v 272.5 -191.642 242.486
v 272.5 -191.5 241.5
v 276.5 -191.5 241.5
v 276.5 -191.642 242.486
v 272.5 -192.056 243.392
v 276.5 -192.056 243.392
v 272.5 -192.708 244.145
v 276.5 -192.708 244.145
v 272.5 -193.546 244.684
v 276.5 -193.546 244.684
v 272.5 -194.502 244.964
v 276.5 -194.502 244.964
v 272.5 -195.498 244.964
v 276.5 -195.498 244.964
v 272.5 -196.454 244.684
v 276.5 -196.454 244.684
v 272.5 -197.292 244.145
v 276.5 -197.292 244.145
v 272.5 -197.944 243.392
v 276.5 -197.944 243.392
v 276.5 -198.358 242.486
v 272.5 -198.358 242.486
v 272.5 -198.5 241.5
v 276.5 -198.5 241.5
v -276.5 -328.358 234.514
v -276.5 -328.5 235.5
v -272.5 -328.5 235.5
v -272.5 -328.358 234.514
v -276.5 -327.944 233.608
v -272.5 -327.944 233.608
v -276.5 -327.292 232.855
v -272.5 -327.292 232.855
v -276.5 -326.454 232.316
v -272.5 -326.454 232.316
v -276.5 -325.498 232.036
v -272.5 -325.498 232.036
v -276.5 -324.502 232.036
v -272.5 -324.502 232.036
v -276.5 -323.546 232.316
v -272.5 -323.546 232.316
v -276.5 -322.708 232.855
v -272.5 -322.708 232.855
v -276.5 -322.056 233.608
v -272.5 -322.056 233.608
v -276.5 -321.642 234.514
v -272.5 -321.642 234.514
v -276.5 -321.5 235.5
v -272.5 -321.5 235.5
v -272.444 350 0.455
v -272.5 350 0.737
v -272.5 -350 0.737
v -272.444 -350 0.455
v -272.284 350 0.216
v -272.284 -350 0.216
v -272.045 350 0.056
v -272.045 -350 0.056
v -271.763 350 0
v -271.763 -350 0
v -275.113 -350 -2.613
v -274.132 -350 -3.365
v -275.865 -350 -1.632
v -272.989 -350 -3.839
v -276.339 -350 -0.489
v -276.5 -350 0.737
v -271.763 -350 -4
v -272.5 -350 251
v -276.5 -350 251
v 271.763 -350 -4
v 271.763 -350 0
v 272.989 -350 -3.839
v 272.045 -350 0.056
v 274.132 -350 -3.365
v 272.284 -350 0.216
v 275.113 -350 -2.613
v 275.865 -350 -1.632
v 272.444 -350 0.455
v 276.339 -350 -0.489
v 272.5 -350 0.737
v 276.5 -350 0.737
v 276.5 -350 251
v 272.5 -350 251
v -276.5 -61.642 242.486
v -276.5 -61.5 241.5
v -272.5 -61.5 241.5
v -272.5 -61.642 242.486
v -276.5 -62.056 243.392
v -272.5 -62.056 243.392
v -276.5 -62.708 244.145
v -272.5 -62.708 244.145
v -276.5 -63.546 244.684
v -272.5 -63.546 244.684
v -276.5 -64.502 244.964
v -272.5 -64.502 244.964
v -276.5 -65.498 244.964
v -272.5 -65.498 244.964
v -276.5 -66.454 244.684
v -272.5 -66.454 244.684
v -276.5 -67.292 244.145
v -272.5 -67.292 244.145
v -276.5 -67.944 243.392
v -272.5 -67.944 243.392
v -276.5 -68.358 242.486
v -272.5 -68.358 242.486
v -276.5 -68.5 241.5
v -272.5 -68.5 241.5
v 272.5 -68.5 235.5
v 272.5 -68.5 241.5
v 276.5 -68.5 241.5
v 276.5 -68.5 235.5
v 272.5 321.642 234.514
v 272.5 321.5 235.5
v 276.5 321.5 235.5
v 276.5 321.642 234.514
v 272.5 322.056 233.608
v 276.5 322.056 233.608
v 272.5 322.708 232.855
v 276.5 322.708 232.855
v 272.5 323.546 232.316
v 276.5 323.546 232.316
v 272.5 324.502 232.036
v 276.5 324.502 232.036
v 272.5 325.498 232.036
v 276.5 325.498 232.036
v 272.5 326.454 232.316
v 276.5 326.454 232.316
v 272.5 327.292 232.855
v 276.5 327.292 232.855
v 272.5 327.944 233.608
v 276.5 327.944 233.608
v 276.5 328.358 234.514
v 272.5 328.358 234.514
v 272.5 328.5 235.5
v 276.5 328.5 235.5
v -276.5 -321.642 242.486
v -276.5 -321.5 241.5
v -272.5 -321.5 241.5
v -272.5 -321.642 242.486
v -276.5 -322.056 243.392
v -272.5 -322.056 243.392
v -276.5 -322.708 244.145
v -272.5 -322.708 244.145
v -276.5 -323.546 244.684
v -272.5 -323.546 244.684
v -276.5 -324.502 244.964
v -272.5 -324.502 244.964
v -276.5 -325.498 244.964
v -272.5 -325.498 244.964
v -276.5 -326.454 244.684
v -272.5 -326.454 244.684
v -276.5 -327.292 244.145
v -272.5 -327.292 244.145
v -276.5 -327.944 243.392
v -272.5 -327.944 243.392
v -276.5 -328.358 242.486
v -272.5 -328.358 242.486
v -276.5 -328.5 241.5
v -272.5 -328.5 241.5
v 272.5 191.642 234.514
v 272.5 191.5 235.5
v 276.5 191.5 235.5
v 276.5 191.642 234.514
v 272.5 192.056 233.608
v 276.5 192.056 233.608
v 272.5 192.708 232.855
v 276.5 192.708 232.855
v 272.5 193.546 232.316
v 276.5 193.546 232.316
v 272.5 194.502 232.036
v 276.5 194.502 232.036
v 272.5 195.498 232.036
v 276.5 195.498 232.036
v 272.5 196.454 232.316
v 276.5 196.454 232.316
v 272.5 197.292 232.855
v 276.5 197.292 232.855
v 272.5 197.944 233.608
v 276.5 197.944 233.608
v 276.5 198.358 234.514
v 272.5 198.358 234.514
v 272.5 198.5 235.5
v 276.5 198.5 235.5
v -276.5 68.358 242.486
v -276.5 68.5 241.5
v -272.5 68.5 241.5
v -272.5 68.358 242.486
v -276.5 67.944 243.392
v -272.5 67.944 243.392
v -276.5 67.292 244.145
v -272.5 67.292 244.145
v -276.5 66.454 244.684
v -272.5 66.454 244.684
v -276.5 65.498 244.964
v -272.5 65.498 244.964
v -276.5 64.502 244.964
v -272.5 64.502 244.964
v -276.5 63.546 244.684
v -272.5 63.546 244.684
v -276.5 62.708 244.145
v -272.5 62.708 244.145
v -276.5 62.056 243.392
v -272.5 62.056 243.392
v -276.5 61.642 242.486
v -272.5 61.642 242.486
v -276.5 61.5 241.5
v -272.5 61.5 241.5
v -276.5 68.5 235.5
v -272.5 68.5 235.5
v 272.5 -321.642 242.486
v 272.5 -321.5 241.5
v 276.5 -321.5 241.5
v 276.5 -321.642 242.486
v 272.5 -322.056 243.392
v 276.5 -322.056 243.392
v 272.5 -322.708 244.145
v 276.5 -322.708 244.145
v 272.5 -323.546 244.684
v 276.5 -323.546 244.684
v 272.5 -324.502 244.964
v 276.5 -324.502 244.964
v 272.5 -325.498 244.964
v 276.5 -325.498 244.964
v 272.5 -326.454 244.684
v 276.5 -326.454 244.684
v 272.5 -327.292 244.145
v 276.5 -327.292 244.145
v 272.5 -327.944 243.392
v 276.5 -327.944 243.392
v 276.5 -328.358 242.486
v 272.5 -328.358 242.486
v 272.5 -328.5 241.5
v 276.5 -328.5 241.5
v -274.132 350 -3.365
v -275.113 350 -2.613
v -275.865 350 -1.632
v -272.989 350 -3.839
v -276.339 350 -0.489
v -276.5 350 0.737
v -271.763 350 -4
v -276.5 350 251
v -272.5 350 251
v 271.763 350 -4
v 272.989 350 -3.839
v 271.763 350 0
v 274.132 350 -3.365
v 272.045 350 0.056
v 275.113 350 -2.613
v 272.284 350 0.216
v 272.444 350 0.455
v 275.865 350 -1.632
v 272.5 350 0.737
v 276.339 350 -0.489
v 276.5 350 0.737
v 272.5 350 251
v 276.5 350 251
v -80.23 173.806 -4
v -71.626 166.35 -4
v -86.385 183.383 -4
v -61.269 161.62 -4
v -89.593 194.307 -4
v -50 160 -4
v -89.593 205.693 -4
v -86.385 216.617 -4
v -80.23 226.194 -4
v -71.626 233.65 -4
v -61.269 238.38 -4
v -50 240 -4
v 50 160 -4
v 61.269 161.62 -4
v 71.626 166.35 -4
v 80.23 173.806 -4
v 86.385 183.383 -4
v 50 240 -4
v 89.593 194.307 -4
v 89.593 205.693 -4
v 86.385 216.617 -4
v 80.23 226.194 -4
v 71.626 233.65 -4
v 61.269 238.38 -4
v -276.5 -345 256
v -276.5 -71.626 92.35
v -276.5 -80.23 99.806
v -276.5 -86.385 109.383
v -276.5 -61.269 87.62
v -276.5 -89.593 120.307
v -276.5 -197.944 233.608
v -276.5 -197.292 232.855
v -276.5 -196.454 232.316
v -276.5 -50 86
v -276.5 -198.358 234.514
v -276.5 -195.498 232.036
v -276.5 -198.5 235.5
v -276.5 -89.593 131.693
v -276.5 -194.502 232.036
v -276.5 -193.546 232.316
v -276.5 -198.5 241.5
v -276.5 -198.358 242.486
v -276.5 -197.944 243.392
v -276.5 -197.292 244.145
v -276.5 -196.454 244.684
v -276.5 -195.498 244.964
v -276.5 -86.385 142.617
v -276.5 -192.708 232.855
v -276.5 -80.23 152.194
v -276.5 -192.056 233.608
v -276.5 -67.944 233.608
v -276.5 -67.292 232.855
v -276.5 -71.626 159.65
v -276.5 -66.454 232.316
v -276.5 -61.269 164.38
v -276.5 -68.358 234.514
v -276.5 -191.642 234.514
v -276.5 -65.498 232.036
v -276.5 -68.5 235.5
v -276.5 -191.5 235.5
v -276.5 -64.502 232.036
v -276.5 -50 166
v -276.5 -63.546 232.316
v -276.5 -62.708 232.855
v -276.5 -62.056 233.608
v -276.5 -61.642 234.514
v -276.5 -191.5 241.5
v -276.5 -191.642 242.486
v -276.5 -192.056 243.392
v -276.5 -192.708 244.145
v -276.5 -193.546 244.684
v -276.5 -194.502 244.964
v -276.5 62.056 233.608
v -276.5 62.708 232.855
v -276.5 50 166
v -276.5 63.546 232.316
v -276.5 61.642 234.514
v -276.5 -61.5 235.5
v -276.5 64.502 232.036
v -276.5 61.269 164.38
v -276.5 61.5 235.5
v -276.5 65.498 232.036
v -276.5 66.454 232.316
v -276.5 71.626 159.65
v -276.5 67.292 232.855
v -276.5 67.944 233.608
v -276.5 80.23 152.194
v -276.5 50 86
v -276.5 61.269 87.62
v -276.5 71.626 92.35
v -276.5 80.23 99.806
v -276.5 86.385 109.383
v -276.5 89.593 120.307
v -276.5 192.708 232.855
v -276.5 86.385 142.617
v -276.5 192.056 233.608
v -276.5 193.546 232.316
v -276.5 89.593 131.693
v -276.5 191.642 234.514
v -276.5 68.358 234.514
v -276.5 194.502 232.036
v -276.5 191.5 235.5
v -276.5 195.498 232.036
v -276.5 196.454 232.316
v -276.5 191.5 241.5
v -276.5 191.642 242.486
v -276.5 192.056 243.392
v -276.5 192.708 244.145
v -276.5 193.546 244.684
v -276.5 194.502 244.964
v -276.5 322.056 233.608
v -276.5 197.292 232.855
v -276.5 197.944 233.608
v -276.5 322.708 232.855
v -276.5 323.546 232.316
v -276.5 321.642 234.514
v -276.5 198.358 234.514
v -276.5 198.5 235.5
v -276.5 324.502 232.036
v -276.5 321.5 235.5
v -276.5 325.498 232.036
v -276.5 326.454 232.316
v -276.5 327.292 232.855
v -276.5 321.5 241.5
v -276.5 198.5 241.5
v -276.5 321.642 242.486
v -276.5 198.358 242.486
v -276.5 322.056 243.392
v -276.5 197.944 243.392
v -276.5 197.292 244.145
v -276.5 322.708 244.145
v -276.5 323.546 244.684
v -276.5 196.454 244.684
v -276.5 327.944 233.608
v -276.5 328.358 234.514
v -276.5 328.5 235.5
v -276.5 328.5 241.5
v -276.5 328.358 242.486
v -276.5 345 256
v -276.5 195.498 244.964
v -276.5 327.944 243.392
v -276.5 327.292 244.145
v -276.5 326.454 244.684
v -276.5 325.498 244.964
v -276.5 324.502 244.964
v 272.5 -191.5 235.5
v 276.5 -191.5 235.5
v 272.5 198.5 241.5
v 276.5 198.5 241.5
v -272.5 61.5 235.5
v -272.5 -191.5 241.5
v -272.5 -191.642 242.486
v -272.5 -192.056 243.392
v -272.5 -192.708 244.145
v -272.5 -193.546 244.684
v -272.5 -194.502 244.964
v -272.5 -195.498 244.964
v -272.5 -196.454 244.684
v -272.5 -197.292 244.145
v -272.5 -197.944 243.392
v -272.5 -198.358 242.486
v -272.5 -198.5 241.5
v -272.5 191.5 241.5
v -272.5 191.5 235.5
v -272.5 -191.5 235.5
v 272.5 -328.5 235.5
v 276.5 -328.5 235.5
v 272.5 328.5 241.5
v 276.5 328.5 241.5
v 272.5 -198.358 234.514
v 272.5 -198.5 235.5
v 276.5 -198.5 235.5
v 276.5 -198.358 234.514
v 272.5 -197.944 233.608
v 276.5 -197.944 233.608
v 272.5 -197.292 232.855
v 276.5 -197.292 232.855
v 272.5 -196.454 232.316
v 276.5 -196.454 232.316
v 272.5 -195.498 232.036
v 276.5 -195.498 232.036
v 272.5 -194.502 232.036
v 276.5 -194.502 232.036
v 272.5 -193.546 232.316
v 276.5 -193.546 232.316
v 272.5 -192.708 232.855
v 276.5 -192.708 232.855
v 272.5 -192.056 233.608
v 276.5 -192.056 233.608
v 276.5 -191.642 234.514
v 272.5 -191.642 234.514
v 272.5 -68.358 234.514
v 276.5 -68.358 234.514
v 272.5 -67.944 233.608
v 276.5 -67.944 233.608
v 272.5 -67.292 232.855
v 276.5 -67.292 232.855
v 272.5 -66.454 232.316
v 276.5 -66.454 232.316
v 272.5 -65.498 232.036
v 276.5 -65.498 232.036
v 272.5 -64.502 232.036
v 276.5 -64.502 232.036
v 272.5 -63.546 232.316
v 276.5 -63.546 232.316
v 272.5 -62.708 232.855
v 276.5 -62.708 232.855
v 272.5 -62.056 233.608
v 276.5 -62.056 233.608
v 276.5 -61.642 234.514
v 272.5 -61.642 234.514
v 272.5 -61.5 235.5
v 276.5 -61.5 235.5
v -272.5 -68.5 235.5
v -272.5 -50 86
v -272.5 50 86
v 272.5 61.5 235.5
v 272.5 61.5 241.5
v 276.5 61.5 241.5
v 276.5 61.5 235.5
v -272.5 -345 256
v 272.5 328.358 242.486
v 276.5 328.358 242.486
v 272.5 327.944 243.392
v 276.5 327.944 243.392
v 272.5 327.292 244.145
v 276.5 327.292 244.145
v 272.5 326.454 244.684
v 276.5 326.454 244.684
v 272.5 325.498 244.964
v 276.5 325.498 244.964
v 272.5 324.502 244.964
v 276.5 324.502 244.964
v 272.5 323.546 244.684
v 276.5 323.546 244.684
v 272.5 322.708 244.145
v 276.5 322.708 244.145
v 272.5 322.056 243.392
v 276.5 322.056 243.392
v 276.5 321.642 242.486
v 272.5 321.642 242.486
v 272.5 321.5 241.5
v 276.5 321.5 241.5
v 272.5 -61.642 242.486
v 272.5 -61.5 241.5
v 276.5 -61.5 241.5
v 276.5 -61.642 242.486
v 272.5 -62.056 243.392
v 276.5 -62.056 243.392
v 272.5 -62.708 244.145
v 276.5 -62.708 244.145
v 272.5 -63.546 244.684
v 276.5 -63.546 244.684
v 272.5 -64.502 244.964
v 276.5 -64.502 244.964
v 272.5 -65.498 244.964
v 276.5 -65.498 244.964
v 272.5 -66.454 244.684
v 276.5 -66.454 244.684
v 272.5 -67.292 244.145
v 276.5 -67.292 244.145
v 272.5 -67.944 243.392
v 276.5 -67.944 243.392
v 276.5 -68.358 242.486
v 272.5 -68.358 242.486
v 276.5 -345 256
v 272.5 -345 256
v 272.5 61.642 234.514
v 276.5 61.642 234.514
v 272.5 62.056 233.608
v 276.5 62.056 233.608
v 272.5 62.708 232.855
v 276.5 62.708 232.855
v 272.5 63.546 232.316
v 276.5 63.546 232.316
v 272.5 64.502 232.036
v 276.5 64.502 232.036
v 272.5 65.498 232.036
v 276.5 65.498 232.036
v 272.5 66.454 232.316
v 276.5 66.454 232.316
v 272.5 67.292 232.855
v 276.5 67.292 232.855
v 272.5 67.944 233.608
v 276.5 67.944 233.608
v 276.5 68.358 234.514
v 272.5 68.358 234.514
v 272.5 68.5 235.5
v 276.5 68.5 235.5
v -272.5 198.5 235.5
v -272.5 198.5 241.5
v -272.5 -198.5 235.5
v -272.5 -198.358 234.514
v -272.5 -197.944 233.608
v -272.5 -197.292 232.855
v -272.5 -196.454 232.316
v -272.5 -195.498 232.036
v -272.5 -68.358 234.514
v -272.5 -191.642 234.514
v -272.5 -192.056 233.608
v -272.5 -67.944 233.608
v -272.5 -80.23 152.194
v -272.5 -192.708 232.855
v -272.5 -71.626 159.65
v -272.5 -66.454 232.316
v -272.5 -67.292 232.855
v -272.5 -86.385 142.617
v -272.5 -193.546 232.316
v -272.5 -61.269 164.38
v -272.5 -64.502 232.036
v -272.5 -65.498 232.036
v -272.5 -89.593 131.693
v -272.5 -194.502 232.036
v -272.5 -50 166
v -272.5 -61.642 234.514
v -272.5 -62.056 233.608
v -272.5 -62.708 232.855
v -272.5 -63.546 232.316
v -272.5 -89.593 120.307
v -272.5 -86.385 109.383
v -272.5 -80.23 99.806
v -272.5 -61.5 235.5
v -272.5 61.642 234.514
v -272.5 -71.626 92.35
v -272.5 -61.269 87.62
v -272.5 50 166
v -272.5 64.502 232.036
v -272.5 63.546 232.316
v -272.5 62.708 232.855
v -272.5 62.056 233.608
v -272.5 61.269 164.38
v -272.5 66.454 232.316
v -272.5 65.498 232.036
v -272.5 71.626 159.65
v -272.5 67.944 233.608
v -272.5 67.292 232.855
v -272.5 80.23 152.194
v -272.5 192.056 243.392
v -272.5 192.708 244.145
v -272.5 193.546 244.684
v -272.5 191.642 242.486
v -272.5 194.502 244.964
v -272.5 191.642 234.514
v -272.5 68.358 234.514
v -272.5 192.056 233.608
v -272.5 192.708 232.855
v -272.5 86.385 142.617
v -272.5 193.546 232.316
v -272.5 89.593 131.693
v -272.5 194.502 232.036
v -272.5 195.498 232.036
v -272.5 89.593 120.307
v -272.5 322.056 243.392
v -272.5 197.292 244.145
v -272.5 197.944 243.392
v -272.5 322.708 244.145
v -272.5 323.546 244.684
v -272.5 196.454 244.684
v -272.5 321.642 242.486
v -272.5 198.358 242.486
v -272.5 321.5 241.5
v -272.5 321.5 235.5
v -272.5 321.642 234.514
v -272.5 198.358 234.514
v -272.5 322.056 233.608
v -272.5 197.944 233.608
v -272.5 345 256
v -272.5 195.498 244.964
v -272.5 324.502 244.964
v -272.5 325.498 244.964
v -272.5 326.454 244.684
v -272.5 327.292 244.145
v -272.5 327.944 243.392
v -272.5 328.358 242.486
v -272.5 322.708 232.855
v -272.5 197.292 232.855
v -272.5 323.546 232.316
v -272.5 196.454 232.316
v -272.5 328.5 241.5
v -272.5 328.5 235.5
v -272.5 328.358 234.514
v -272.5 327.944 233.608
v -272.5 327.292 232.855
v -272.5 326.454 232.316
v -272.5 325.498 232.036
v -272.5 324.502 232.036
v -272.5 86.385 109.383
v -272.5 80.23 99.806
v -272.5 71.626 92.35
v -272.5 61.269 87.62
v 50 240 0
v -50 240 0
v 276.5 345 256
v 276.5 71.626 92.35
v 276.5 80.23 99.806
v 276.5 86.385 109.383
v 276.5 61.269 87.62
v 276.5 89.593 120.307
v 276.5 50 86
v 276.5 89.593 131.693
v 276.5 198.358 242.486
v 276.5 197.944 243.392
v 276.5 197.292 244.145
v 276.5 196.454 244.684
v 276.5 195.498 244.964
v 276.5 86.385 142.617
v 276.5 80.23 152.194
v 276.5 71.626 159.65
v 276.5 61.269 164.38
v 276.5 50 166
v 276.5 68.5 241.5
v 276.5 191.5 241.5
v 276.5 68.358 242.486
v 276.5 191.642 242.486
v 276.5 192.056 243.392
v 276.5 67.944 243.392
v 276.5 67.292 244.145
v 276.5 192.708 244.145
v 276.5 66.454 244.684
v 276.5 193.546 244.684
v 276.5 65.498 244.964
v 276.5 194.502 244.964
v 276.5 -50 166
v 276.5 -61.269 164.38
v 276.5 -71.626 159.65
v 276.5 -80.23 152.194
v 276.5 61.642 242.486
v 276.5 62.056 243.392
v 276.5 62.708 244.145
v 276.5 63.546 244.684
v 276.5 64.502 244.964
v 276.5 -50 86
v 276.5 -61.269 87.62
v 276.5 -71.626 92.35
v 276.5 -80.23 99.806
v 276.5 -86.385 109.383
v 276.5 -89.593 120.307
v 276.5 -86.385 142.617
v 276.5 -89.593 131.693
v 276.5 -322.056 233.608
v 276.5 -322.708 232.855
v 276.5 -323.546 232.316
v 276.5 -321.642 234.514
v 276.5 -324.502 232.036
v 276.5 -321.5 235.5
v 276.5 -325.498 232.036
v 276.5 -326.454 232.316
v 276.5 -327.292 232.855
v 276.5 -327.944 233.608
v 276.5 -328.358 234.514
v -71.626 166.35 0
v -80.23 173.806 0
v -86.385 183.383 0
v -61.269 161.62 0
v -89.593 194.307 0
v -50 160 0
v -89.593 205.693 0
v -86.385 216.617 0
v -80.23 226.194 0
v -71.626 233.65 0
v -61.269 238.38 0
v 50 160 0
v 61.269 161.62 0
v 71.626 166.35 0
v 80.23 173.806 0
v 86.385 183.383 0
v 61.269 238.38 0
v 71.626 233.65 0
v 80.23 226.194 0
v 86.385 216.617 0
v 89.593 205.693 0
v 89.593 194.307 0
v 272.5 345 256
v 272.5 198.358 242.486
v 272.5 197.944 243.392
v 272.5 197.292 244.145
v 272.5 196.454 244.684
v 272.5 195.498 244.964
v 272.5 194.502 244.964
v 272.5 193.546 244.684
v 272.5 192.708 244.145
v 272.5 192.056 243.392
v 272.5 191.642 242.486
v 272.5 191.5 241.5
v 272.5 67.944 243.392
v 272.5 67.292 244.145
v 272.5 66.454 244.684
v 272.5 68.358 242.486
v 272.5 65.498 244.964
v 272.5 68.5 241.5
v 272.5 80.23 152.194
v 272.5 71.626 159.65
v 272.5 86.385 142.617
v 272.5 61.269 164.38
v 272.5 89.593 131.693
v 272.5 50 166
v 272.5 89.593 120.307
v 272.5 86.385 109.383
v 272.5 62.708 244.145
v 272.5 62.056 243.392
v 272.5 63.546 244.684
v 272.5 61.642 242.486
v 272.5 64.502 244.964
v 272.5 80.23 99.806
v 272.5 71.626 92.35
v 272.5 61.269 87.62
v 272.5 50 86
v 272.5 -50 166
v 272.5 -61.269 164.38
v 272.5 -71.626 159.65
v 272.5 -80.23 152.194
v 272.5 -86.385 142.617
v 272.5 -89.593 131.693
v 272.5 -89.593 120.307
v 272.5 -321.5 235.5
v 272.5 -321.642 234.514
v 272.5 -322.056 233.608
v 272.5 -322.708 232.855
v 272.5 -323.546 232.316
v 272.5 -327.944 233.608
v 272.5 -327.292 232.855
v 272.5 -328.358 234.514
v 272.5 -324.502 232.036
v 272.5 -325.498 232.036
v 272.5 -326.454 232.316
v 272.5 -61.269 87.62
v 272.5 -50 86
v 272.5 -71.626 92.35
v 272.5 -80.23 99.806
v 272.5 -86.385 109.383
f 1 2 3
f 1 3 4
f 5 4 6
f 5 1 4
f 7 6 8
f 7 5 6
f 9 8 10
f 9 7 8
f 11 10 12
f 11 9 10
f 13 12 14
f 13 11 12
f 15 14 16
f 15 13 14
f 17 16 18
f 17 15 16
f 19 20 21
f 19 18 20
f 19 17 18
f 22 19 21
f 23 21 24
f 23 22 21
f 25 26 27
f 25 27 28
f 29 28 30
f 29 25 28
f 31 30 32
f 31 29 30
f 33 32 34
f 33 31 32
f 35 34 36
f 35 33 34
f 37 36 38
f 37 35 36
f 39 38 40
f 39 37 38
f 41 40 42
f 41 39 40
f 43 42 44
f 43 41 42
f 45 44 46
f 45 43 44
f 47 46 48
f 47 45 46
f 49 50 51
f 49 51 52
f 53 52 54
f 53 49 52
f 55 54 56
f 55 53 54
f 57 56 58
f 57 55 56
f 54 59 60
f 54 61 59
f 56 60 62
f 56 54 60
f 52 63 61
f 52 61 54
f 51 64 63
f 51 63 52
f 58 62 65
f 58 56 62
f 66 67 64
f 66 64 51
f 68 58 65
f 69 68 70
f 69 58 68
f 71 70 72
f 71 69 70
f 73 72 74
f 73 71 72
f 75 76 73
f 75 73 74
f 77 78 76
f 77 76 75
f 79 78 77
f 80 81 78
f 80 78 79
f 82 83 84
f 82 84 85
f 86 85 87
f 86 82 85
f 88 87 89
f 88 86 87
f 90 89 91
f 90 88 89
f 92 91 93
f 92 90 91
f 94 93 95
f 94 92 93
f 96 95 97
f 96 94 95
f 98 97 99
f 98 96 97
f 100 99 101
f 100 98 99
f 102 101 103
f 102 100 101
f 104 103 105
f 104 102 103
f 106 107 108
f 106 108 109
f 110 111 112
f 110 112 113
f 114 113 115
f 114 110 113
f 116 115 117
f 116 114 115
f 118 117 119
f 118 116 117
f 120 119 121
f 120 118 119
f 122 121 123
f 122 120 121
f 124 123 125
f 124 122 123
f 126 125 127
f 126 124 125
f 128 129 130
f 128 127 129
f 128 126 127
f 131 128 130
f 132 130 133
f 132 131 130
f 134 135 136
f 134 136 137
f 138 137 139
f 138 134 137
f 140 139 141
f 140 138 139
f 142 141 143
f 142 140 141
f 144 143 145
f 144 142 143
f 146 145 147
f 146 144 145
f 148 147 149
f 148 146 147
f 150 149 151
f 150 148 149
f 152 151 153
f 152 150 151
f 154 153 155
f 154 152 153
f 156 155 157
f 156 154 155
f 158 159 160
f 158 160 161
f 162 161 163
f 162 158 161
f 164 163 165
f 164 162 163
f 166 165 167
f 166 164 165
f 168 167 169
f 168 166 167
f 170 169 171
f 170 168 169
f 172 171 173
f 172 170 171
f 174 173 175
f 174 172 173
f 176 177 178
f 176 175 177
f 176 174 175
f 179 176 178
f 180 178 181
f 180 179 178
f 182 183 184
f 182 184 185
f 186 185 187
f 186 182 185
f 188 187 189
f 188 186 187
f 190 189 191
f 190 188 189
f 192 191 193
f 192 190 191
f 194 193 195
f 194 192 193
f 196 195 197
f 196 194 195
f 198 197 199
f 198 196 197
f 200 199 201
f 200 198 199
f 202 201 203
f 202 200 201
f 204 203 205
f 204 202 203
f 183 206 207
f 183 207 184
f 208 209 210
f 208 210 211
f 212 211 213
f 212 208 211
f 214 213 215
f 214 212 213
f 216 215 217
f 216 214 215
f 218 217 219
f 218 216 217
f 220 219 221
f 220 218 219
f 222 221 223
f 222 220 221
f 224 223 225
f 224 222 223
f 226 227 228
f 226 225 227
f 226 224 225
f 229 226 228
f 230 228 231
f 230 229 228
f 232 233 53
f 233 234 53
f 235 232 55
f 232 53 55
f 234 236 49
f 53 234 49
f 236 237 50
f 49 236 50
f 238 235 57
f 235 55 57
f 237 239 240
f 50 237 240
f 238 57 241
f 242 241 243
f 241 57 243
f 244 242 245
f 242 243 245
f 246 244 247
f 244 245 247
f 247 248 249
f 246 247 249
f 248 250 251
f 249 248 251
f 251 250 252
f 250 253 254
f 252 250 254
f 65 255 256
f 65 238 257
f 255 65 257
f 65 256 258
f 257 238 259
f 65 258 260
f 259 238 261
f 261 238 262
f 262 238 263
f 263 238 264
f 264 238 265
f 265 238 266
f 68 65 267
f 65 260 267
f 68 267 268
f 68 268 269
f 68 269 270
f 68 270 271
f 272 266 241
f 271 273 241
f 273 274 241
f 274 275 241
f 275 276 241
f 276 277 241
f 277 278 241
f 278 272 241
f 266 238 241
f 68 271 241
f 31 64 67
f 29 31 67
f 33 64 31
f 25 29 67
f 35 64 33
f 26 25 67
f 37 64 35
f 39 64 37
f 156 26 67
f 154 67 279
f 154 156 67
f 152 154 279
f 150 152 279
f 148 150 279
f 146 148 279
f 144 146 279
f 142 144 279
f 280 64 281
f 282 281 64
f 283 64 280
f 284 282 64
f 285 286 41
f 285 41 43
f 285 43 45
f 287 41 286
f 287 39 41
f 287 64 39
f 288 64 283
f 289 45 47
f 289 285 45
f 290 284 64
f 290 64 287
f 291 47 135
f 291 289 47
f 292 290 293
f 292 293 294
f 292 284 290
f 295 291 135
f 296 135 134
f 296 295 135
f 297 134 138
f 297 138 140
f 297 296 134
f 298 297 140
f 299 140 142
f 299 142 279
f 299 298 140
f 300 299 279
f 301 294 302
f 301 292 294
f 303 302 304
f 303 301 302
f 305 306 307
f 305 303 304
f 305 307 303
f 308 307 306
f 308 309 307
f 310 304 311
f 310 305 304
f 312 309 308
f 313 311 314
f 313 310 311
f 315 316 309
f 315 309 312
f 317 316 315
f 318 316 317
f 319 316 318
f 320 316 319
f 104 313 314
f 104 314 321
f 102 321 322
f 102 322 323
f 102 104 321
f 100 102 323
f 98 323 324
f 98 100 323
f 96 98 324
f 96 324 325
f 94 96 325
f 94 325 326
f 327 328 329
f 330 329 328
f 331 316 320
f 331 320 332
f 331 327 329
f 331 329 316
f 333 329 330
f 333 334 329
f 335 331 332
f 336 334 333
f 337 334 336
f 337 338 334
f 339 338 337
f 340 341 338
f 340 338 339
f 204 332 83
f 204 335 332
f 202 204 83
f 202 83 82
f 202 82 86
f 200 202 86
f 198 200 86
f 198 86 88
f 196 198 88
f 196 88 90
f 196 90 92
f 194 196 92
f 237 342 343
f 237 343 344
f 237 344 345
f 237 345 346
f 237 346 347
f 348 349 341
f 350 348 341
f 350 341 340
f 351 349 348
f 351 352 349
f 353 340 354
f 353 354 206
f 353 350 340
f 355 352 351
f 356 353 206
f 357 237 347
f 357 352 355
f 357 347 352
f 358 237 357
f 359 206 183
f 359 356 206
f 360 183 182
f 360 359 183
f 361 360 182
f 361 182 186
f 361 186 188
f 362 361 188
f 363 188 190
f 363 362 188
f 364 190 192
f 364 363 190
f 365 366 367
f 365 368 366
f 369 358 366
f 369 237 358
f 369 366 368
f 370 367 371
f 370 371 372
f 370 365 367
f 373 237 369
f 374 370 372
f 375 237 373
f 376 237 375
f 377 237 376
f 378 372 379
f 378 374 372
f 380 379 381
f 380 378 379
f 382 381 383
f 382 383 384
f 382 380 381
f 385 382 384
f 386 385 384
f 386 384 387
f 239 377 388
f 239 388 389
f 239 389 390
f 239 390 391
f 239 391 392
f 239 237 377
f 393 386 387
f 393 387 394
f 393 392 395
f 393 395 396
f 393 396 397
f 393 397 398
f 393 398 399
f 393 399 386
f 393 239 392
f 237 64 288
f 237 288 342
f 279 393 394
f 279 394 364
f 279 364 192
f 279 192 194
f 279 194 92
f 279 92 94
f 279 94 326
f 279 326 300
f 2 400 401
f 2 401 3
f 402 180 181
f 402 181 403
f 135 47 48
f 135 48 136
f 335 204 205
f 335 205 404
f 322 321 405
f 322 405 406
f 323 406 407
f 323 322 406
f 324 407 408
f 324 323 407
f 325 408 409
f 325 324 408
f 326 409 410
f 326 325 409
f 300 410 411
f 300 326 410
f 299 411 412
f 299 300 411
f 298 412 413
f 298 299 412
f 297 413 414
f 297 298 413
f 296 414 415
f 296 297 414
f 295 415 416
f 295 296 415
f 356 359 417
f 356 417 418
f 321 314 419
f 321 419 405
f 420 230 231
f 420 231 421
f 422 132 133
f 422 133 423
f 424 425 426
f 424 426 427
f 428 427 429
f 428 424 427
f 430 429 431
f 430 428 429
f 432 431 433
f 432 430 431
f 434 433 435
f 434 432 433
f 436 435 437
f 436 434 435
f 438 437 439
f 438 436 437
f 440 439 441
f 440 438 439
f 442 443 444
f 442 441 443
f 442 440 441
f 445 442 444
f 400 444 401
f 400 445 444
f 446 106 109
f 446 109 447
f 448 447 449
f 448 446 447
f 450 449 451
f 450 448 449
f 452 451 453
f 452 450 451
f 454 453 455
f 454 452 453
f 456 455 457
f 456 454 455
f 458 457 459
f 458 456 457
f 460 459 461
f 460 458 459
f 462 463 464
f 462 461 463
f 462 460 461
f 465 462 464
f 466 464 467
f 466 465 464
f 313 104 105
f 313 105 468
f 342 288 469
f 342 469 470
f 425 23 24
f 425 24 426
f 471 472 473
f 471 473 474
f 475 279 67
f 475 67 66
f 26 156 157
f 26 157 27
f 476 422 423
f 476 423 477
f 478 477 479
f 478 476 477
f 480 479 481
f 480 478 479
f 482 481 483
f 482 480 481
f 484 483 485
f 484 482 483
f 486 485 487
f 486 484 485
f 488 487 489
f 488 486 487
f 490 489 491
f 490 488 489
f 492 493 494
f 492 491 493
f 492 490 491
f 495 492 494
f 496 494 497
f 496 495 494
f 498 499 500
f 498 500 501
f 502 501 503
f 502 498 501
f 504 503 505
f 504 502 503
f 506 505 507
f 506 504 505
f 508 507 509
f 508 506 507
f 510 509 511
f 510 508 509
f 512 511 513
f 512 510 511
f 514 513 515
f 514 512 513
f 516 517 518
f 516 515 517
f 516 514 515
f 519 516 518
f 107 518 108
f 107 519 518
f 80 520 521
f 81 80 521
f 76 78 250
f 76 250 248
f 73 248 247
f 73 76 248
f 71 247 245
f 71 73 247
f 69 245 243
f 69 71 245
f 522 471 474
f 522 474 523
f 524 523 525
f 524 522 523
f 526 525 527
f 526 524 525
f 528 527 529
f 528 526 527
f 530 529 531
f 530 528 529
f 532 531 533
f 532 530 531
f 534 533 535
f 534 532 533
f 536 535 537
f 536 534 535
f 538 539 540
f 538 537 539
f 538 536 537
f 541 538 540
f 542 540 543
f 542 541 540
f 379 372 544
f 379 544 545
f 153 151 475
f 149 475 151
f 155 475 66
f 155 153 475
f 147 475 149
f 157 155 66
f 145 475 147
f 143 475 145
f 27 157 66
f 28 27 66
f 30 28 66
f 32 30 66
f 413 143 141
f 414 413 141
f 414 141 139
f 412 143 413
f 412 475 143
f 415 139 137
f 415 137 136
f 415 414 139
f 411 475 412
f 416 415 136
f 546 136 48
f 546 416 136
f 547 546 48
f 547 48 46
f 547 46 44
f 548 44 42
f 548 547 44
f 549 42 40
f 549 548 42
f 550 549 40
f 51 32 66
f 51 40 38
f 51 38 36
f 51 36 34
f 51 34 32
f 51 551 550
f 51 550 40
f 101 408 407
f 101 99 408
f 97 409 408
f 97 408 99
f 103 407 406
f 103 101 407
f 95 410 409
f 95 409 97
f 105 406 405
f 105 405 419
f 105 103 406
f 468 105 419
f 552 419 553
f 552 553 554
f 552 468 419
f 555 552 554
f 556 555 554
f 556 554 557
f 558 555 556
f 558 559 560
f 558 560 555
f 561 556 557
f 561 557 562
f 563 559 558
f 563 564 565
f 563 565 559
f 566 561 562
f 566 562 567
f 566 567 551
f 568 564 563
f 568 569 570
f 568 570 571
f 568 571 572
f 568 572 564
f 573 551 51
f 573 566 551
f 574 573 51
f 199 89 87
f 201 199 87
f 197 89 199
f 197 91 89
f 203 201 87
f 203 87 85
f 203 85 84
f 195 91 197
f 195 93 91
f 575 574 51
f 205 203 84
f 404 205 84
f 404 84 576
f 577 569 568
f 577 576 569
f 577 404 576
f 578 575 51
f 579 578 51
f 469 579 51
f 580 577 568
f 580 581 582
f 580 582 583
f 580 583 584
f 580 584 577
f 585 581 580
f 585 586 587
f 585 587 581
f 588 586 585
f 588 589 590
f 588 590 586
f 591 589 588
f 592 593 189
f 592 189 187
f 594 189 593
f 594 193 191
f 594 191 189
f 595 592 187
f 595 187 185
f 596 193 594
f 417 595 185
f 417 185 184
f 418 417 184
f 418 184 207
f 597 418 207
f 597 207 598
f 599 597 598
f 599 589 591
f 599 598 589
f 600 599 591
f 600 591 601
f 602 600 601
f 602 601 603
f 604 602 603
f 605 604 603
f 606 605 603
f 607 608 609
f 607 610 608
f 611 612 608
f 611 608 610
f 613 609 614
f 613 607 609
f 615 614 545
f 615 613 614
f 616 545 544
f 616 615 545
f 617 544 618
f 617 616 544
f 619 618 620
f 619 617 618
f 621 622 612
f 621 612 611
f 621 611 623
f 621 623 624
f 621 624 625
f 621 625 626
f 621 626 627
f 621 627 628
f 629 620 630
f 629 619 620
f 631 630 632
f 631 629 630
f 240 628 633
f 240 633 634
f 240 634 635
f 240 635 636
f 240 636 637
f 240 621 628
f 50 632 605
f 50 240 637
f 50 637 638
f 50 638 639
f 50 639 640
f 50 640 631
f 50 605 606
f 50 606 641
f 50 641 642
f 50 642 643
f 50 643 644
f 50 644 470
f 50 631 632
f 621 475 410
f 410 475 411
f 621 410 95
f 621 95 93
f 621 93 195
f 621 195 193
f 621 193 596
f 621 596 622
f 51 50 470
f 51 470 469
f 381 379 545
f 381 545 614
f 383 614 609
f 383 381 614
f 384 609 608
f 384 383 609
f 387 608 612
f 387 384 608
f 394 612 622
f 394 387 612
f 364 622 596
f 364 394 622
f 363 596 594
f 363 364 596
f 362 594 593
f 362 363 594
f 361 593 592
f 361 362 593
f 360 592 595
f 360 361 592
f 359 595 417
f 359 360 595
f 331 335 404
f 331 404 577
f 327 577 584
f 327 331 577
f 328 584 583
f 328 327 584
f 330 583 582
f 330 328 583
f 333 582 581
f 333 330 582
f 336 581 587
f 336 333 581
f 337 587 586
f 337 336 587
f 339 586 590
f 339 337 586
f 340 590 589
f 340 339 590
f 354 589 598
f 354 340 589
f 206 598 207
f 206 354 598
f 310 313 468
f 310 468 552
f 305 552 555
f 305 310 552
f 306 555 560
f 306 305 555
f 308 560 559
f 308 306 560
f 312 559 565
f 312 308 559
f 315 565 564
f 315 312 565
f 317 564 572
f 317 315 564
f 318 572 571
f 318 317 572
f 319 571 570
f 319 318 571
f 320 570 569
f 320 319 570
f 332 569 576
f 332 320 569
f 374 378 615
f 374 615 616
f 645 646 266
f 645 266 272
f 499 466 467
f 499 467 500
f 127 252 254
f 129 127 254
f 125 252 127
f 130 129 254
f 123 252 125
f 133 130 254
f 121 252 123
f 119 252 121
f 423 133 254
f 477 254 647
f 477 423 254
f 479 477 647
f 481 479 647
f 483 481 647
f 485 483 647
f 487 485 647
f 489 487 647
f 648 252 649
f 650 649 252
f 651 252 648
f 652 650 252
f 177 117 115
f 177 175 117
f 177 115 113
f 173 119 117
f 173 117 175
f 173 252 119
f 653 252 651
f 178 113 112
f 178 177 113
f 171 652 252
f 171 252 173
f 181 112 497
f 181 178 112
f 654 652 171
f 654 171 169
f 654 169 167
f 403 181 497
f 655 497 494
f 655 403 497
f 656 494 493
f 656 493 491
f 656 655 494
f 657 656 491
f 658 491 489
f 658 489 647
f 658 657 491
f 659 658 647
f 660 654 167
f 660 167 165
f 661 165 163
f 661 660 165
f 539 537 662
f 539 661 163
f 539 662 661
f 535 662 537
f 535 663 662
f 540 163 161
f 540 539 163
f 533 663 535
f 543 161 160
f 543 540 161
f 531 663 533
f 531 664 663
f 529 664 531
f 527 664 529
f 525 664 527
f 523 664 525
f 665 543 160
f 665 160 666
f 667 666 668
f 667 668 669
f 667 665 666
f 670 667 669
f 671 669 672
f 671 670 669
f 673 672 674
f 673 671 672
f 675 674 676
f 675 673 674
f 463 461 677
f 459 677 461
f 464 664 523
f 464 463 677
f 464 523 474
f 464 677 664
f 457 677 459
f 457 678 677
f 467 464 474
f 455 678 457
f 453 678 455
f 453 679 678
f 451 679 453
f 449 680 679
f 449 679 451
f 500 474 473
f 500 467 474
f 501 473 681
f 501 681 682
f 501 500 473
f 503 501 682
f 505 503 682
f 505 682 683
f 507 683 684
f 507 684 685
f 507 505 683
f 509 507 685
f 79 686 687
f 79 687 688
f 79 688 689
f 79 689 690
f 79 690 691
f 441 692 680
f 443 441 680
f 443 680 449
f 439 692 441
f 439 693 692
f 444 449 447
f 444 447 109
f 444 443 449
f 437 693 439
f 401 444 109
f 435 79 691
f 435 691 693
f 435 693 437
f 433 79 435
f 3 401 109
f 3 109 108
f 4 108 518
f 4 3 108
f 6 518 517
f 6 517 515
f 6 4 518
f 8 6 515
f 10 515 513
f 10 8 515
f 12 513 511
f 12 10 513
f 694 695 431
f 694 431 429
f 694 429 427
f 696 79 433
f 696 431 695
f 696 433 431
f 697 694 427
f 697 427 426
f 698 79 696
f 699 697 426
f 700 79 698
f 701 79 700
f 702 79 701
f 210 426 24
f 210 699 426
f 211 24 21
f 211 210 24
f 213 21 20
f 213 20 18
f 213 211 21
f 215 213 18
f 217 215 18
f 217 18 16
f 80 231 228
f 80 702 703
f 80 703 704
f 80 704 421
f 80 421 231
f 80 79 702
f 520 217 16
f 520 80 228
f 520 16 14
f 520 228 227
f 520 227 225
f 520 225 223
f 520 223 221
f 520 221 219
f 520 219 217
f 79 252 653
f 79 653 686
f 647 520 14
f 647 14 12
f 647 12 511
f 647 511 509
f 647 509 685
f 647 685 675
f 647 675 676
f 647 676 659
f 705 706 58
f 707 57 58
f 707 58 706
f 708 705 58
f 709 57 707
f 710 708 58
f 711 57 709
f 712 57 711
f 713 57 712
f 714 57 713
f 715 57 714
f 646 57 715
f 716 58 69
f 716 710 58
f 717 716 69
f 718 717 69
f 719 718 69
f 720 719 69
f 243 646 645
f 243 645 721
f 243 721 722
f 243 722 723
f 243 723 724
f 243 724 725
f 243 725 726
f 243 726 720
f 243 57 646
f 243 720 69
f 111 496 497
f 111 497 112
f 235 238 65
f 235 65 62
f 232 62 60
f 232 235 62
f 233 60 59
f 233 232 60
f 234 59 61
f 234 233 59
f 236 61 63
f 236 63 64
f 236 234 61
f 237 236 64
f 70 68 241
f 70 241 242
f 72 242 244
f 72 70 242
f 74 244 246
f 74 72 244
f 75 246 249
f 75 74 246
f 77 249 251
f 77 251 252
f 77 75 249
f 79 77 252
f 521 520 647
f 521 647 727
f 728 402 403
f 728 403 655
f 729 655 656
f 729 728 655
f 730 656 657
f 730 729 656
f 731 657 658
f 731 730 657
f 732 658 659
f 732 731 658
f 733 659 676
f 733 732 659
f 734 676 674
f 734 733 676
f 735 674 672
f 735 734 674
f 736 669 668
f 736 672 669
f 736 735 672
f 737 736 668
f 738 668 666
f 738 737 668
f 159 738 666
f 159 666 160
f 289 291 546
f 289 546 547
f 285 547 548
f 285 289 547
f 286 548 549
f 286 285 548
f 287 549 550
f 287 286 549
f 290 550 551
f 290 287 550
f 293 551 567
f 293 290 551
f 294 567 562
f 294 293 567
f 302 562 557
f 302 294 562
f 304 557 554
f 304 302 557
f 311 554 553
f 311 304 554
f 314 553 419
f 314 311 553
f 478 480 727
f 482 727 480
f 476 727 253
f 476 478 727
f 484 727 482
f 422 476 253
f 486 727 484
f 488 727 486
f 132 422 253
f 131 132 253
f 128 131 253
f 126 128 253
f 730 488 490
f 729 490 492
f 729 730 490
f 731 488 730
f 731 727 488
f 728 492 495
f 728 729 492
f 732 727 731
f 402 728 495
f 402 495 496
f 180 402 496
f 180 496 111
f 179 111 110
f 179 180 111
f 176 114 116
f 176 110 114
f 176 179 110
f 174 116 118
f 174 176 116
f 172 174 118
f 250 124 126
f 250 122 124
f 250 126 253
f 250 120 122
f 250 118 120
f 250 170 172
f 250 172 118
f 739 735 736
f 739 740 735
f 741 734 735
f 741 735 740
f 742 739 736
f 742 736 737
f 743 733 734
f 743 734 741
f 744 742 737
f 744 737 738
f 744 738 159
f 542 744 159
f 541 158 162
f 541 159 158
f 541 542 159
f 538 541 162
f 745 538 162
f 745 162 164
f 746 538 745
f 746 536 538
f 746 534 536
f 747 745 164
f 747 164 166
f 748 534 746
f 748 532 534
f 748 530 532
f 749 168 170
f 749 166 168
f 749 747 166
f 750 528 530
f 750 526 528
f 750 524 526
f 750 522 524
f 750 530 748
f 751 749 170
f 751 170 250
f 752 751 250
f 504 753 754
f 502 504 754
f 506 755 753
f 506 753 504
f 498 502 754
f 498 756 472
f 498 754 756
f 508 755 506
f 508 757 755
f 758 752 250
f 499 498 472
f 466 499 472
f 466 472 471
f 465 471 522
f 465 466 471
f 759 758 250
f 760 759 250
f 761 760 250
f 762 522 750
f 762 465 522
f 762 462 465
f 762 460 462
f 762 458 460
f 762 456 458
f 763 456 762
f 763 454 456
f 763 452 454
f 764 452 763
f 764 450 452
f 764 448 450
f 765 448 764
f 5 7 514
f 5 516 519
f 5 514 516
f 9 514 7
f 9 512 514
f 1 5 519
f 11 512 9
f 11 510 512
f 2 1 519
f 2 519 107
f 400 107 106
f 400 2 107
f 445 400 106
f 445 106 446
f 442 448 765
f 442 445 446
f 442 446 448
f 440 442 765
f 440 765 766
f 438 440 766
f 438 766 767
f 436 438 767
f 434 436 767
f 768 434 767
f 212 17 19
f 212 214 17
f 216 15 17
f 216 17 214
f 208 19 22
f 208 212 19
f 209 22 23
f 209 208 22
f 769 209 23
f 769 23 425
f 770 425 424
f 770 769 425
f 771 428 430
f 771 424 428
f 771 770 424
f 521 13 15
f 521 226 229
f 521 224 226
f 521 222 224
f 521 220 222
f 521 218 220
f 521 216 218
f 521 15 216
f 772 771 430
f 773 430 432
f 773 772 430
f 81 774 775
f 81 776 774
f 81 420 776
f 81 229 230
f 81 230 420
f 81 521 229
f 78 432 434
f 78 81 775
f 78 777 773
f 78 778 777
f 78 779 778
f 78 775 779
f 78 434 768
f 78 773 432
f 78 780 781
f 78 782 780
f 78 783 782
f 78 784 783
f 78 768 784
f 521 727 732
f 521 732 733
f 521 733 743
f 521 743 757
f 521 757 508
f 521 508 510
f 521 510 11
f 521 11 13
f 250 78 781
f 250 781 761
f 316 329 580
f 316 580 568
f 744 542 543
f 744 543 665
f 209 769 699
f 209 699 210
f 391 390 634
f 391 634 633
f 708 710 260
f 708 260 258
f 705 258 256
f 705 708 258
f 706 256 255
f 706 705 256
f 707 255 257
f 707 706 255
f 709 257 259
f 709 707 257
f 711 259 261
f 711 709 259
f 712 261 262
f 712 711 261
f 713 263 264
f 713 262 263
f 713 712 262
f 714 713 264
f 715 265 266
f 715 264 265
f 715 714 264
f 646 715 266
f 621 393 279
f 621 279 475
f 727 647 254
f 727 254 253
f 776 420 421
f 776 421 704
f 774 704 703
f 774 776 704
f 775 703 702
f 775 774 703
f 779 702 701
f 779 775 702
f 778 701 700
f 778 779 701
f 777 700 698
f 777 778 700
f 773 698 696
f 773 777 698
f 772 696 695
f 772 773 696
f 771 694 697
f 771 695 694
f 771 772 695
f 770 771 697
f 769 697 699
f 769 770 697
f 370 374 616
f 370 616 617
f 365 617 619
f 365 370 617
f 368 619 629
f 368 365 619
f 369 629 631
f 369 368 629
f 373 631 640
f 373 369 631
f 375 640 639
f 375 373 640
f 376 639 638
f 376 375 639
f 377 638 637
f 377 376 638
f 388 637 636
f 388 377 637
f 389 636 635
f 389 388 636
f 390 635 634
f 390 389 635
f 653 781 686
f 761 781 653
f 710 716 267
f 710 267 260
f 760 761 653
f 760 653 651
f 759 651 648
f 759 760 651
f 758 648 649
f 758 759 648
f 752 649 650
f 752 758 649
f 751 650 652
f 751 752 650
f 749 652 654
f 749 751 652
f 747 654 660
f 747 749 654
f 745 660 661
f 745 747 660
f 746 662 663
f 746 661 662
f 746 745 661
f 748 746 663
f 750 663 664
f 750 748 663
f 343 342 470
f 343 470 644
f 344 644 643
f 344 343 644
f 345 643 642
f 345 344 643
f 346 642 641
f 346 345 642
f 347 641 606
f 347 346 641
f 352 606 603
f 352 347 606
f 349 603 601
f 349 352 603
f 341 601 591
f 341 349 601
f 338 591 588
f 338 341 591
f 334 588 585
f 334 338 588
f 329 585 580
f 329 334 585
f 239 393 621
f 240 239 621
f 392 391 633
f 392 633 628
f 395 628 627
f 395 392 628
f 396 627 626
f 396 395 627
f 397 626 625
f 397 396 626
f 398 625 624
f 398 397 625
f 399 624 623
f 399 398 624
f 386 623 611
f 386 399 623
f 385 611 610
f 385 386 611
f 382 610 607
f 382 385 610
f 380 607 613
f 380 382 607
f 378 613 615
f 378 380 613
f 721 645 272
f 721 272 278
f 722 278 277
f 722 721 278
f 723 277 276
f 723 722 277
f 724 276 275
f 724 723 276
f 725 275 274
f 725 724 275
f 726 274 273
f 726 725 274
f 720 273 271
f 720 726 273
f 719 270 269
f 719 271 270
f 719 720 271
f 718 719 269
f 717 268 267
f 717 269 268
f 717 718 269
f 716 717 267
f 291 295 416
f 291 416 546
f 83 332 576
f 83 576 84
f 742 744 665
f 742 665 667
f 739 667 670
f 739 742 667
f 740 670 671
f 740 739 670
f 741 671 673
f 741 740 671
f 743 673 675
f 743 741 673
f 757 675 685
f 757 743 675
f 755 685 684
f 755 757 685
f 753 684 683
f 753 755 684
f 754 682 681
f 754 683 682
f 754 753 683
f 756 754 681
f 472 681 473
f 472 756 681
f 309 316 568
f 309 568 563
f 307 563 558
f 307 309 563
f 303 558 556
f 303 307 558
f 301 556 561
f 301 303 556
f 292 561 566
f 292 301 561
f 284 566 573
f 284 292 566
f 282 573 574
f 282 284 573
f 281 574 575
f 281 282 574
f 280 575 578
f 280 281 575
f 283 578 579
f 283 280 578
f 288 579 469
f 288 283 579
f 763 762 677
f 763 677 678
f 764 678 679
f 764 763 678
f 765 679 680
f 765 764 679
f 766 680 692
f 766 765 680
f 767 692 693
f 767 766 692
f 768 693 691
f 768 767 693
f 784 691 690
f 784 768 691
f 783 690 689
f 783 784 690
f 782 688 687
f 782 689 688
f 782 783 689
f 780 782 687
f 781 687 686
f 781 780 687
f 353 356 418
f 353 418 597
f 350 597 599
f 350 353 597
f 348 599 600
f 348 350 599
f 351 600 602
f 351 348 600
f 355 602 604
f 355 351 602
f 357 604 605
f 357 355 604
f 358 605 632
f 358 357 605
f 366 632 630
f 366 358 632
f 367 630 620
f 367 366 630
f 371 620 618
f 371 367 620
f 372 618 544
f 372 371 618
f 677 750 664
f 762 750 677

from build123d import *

# Parameters (mm, degrees)
SKETCH_1_W                         = 553
SKETCH_1_H                         = 700
SM_BASE_FLANGE_1_DEPTH             = 4
SM_EDGE_FLANGE_1_STRIP_W           = 17.4732
SM_EDGE_FLANGE_1_STRIP_H           = 4
SM_EDGE_FLANGE_1_STRIP_CUT_DEPTH   = 700
SM_EDGE_FLANGE_1_STRIP_2_W         = 17.4732
SM_EDGE_FLANGE_1_STRIP_2_H         = 4
SM_EDGE_FLANGE_1_STRIP_CUT_2_DEPTH = 700
SM_EDGE_FLANGE_1_DEPTH             = 700
SM_EDGE_FLANGE_1_BEND_DEPTH        = 700
CUT_EXTRUDE_1_DEPTH                = 703.741061843
CUT_EXTRUDE_2_DEPTH                = 10
CHAMFER_1_SIZE                     = 5
CUT_EXTRUDE_3_DEPTH                = 703.741061843
PATTERN_LINEAR_1_COUNT             = 6
PATTERN_LINEAR_1_PITCH             = 130


# Sheet-metal steps are written as plain solids
with BuildPart() as part:
    # Sketch 1 → 基体-法兰1 (new body)
    with BuildSketch(Plane.XY):
        Rectangle(SKETCH_1_W, SKETCH_1_H)
    extrude(amount=-SM_BASE_FLANGE_1_DEPTH)

    # 边线-法兰1 strip (across the edge) → 边线-法兰1 strip cut (cut)
    with BuildSketch(Plane(origin=(-276.5, 350, 0), x_dir=(1, 0, 0), z_dir=(0, -1, 0))):
        with Locations((-4, -2)):
            Rectangle(SM_EDGE_FLANGE_1_STRIP_W, SM_EDGE_FLANGE_1_STRIP_H)
    extrude(amount=SM_EDGE_FLANGE_1_STRIP_CUT_DEPTH, mode=Mode.SUBTRACT)

    # 边线-法兰1 strip 2 (across the edge) → 边线-法兰1 strip cut 2 (cut)
    with BuildSketch(Plane(origin=(276.5, -350, 0), x_dir=(-1, 0, 0), z_dir=(0, 1, 0))):
        with Locations((-4, -2)):
            Rectangle(SM_EDGE_FLANGE_1_STRIP_2_W, SM_EDGE_FLANGE_1_STRIP_2_H)
    extrude(amount=SM_EDGE_FLANGE_1_STRIP_CUT_2_DEPTH, mode=Mode.SUBTRACT)

    # 边线-法兰1 section (across the edge) → 边线-法兰1 (add)
    with BuildSketch(Plane(origin=(-276.5, 350, 0), x_dir=(1, 0, 0), z_dir=(0, -1, 0))):
        with BuildLine():
            Line((0, 0.7366), (0, 256))
            Line((0, 256), (4, 256))
            Line((4, 256), (4, 0.7366))
            ThreePointArc((4, 0.7366), (4.215745145, 0.215745145), (4.7366, 0))
            Line((4.7366, 0), (4.7366, -4))
            ThreePointArc((4.7366, -4), (1.38731802, -2.61268198), (0, 0.7366))
        make_face()
    extrude(amount=SM_EDGE_FLANGE_1_DEPTH)

    # 边线-法兰1 section 2 (across the edge) → 边线-法兰1 bend (add)
    with BuildSketch(Plane(origin=(276.5, -350, 0), x_dir=(-1, 0, 0), z_dir=(0, 1, 0))):
        with BuildLine():
            Line((0, 0.7366), (0, 256))
            Line((0, 256), (4, 256))
            Line((4, 256), (4, 0.7366))
            ThreePointArc((4, 0.7366), (4.215745145, 0.215745145), (4.7366, 0))
            Line((4.7366, 0), (4.7366, -4))
            ThreePointArc((4.7366, -4), (1.38731802, -2.61268198), (0, 0.7366))
        make_face()
    extrude(amount=SM_EDGE_FLANGE_1_BEND_DEPTH)

    # 草图15 → 切除-拉伸1 (cut, through all)
    with BuildSketch(Plane.ZY.offset(276.5)):
        with BuildLine():
            Line((166, 50), (166, -50))
            ThreePointArc((166, -50), (126, -90), (86, -50))
            Line((86, -50), (86, 50))
            ThreePointArc((86, 50), (126, 90), (166, 50))
        make_face()
    extrude(amount=-CUT_EXTRUDE_1_DEPTH, mode=Mode.SUBTRACT)

    # 草图16 → 切除-拉伸2 (cut)
    with BuildSketch(Plane.XY):
        with BuildLine():
            Line((-50, 240), (50, 240))
            ThreePointArc((50, 240), (90, 200), (50, 160))
            Line((50, 160), (-50, 160))
            ThreePointArc((-50, 160), (-90, 200), (-50, 240))
        make_face()
    extrude(amount=-CUT_EXTRUDE_2_DEPTH, mode=Mode.SUBTRACT)

    # 倒角1
    chamfer_1_edges = [part.edges().sort_by_distance(p)[0] for p in [
        (-274.5, 350, 256),
        (-274.5, -350, 256),
        (274.5, -350, 256),
        (274.5, 350, 256),
    ]]
    chamfer(chamfer_1_edges, length=CHAMFER_1_SIZE)

    # 草图17 → 切除-拉伸3 (cut, through all)
    with BuildSketch(Plane.ZY.offset(276.5)):
        with BuildLine():
            Line((235.5, 328.5), (241.5, 328.5))
            ThreePointArc((241.5, 328.5), (245, 325), (241.5, 321.5))
            Line((241.5, 321.5), (235.5, 321.5))
            ThreePointArc((235.5, 321.5), (232, 325), (235.5, 328.5))
        make_face()
    cut_extrude_3 = extrude(amount=-CUT_EXTRUDE_3_DEPTH, mode=Mode.SUBTRACT)

    # 阵列(线性)1: 切除-拉伸3 ×6
    with Locations(*[(0, -i * PATTERN_LINEAR_1_PITCH, 0) for i in range(1, PATTERN_LINEAR_1_COUNT)]):
        add(cut_extrude_3, mode=Mode.SUBTRACT)


solid = part.part
